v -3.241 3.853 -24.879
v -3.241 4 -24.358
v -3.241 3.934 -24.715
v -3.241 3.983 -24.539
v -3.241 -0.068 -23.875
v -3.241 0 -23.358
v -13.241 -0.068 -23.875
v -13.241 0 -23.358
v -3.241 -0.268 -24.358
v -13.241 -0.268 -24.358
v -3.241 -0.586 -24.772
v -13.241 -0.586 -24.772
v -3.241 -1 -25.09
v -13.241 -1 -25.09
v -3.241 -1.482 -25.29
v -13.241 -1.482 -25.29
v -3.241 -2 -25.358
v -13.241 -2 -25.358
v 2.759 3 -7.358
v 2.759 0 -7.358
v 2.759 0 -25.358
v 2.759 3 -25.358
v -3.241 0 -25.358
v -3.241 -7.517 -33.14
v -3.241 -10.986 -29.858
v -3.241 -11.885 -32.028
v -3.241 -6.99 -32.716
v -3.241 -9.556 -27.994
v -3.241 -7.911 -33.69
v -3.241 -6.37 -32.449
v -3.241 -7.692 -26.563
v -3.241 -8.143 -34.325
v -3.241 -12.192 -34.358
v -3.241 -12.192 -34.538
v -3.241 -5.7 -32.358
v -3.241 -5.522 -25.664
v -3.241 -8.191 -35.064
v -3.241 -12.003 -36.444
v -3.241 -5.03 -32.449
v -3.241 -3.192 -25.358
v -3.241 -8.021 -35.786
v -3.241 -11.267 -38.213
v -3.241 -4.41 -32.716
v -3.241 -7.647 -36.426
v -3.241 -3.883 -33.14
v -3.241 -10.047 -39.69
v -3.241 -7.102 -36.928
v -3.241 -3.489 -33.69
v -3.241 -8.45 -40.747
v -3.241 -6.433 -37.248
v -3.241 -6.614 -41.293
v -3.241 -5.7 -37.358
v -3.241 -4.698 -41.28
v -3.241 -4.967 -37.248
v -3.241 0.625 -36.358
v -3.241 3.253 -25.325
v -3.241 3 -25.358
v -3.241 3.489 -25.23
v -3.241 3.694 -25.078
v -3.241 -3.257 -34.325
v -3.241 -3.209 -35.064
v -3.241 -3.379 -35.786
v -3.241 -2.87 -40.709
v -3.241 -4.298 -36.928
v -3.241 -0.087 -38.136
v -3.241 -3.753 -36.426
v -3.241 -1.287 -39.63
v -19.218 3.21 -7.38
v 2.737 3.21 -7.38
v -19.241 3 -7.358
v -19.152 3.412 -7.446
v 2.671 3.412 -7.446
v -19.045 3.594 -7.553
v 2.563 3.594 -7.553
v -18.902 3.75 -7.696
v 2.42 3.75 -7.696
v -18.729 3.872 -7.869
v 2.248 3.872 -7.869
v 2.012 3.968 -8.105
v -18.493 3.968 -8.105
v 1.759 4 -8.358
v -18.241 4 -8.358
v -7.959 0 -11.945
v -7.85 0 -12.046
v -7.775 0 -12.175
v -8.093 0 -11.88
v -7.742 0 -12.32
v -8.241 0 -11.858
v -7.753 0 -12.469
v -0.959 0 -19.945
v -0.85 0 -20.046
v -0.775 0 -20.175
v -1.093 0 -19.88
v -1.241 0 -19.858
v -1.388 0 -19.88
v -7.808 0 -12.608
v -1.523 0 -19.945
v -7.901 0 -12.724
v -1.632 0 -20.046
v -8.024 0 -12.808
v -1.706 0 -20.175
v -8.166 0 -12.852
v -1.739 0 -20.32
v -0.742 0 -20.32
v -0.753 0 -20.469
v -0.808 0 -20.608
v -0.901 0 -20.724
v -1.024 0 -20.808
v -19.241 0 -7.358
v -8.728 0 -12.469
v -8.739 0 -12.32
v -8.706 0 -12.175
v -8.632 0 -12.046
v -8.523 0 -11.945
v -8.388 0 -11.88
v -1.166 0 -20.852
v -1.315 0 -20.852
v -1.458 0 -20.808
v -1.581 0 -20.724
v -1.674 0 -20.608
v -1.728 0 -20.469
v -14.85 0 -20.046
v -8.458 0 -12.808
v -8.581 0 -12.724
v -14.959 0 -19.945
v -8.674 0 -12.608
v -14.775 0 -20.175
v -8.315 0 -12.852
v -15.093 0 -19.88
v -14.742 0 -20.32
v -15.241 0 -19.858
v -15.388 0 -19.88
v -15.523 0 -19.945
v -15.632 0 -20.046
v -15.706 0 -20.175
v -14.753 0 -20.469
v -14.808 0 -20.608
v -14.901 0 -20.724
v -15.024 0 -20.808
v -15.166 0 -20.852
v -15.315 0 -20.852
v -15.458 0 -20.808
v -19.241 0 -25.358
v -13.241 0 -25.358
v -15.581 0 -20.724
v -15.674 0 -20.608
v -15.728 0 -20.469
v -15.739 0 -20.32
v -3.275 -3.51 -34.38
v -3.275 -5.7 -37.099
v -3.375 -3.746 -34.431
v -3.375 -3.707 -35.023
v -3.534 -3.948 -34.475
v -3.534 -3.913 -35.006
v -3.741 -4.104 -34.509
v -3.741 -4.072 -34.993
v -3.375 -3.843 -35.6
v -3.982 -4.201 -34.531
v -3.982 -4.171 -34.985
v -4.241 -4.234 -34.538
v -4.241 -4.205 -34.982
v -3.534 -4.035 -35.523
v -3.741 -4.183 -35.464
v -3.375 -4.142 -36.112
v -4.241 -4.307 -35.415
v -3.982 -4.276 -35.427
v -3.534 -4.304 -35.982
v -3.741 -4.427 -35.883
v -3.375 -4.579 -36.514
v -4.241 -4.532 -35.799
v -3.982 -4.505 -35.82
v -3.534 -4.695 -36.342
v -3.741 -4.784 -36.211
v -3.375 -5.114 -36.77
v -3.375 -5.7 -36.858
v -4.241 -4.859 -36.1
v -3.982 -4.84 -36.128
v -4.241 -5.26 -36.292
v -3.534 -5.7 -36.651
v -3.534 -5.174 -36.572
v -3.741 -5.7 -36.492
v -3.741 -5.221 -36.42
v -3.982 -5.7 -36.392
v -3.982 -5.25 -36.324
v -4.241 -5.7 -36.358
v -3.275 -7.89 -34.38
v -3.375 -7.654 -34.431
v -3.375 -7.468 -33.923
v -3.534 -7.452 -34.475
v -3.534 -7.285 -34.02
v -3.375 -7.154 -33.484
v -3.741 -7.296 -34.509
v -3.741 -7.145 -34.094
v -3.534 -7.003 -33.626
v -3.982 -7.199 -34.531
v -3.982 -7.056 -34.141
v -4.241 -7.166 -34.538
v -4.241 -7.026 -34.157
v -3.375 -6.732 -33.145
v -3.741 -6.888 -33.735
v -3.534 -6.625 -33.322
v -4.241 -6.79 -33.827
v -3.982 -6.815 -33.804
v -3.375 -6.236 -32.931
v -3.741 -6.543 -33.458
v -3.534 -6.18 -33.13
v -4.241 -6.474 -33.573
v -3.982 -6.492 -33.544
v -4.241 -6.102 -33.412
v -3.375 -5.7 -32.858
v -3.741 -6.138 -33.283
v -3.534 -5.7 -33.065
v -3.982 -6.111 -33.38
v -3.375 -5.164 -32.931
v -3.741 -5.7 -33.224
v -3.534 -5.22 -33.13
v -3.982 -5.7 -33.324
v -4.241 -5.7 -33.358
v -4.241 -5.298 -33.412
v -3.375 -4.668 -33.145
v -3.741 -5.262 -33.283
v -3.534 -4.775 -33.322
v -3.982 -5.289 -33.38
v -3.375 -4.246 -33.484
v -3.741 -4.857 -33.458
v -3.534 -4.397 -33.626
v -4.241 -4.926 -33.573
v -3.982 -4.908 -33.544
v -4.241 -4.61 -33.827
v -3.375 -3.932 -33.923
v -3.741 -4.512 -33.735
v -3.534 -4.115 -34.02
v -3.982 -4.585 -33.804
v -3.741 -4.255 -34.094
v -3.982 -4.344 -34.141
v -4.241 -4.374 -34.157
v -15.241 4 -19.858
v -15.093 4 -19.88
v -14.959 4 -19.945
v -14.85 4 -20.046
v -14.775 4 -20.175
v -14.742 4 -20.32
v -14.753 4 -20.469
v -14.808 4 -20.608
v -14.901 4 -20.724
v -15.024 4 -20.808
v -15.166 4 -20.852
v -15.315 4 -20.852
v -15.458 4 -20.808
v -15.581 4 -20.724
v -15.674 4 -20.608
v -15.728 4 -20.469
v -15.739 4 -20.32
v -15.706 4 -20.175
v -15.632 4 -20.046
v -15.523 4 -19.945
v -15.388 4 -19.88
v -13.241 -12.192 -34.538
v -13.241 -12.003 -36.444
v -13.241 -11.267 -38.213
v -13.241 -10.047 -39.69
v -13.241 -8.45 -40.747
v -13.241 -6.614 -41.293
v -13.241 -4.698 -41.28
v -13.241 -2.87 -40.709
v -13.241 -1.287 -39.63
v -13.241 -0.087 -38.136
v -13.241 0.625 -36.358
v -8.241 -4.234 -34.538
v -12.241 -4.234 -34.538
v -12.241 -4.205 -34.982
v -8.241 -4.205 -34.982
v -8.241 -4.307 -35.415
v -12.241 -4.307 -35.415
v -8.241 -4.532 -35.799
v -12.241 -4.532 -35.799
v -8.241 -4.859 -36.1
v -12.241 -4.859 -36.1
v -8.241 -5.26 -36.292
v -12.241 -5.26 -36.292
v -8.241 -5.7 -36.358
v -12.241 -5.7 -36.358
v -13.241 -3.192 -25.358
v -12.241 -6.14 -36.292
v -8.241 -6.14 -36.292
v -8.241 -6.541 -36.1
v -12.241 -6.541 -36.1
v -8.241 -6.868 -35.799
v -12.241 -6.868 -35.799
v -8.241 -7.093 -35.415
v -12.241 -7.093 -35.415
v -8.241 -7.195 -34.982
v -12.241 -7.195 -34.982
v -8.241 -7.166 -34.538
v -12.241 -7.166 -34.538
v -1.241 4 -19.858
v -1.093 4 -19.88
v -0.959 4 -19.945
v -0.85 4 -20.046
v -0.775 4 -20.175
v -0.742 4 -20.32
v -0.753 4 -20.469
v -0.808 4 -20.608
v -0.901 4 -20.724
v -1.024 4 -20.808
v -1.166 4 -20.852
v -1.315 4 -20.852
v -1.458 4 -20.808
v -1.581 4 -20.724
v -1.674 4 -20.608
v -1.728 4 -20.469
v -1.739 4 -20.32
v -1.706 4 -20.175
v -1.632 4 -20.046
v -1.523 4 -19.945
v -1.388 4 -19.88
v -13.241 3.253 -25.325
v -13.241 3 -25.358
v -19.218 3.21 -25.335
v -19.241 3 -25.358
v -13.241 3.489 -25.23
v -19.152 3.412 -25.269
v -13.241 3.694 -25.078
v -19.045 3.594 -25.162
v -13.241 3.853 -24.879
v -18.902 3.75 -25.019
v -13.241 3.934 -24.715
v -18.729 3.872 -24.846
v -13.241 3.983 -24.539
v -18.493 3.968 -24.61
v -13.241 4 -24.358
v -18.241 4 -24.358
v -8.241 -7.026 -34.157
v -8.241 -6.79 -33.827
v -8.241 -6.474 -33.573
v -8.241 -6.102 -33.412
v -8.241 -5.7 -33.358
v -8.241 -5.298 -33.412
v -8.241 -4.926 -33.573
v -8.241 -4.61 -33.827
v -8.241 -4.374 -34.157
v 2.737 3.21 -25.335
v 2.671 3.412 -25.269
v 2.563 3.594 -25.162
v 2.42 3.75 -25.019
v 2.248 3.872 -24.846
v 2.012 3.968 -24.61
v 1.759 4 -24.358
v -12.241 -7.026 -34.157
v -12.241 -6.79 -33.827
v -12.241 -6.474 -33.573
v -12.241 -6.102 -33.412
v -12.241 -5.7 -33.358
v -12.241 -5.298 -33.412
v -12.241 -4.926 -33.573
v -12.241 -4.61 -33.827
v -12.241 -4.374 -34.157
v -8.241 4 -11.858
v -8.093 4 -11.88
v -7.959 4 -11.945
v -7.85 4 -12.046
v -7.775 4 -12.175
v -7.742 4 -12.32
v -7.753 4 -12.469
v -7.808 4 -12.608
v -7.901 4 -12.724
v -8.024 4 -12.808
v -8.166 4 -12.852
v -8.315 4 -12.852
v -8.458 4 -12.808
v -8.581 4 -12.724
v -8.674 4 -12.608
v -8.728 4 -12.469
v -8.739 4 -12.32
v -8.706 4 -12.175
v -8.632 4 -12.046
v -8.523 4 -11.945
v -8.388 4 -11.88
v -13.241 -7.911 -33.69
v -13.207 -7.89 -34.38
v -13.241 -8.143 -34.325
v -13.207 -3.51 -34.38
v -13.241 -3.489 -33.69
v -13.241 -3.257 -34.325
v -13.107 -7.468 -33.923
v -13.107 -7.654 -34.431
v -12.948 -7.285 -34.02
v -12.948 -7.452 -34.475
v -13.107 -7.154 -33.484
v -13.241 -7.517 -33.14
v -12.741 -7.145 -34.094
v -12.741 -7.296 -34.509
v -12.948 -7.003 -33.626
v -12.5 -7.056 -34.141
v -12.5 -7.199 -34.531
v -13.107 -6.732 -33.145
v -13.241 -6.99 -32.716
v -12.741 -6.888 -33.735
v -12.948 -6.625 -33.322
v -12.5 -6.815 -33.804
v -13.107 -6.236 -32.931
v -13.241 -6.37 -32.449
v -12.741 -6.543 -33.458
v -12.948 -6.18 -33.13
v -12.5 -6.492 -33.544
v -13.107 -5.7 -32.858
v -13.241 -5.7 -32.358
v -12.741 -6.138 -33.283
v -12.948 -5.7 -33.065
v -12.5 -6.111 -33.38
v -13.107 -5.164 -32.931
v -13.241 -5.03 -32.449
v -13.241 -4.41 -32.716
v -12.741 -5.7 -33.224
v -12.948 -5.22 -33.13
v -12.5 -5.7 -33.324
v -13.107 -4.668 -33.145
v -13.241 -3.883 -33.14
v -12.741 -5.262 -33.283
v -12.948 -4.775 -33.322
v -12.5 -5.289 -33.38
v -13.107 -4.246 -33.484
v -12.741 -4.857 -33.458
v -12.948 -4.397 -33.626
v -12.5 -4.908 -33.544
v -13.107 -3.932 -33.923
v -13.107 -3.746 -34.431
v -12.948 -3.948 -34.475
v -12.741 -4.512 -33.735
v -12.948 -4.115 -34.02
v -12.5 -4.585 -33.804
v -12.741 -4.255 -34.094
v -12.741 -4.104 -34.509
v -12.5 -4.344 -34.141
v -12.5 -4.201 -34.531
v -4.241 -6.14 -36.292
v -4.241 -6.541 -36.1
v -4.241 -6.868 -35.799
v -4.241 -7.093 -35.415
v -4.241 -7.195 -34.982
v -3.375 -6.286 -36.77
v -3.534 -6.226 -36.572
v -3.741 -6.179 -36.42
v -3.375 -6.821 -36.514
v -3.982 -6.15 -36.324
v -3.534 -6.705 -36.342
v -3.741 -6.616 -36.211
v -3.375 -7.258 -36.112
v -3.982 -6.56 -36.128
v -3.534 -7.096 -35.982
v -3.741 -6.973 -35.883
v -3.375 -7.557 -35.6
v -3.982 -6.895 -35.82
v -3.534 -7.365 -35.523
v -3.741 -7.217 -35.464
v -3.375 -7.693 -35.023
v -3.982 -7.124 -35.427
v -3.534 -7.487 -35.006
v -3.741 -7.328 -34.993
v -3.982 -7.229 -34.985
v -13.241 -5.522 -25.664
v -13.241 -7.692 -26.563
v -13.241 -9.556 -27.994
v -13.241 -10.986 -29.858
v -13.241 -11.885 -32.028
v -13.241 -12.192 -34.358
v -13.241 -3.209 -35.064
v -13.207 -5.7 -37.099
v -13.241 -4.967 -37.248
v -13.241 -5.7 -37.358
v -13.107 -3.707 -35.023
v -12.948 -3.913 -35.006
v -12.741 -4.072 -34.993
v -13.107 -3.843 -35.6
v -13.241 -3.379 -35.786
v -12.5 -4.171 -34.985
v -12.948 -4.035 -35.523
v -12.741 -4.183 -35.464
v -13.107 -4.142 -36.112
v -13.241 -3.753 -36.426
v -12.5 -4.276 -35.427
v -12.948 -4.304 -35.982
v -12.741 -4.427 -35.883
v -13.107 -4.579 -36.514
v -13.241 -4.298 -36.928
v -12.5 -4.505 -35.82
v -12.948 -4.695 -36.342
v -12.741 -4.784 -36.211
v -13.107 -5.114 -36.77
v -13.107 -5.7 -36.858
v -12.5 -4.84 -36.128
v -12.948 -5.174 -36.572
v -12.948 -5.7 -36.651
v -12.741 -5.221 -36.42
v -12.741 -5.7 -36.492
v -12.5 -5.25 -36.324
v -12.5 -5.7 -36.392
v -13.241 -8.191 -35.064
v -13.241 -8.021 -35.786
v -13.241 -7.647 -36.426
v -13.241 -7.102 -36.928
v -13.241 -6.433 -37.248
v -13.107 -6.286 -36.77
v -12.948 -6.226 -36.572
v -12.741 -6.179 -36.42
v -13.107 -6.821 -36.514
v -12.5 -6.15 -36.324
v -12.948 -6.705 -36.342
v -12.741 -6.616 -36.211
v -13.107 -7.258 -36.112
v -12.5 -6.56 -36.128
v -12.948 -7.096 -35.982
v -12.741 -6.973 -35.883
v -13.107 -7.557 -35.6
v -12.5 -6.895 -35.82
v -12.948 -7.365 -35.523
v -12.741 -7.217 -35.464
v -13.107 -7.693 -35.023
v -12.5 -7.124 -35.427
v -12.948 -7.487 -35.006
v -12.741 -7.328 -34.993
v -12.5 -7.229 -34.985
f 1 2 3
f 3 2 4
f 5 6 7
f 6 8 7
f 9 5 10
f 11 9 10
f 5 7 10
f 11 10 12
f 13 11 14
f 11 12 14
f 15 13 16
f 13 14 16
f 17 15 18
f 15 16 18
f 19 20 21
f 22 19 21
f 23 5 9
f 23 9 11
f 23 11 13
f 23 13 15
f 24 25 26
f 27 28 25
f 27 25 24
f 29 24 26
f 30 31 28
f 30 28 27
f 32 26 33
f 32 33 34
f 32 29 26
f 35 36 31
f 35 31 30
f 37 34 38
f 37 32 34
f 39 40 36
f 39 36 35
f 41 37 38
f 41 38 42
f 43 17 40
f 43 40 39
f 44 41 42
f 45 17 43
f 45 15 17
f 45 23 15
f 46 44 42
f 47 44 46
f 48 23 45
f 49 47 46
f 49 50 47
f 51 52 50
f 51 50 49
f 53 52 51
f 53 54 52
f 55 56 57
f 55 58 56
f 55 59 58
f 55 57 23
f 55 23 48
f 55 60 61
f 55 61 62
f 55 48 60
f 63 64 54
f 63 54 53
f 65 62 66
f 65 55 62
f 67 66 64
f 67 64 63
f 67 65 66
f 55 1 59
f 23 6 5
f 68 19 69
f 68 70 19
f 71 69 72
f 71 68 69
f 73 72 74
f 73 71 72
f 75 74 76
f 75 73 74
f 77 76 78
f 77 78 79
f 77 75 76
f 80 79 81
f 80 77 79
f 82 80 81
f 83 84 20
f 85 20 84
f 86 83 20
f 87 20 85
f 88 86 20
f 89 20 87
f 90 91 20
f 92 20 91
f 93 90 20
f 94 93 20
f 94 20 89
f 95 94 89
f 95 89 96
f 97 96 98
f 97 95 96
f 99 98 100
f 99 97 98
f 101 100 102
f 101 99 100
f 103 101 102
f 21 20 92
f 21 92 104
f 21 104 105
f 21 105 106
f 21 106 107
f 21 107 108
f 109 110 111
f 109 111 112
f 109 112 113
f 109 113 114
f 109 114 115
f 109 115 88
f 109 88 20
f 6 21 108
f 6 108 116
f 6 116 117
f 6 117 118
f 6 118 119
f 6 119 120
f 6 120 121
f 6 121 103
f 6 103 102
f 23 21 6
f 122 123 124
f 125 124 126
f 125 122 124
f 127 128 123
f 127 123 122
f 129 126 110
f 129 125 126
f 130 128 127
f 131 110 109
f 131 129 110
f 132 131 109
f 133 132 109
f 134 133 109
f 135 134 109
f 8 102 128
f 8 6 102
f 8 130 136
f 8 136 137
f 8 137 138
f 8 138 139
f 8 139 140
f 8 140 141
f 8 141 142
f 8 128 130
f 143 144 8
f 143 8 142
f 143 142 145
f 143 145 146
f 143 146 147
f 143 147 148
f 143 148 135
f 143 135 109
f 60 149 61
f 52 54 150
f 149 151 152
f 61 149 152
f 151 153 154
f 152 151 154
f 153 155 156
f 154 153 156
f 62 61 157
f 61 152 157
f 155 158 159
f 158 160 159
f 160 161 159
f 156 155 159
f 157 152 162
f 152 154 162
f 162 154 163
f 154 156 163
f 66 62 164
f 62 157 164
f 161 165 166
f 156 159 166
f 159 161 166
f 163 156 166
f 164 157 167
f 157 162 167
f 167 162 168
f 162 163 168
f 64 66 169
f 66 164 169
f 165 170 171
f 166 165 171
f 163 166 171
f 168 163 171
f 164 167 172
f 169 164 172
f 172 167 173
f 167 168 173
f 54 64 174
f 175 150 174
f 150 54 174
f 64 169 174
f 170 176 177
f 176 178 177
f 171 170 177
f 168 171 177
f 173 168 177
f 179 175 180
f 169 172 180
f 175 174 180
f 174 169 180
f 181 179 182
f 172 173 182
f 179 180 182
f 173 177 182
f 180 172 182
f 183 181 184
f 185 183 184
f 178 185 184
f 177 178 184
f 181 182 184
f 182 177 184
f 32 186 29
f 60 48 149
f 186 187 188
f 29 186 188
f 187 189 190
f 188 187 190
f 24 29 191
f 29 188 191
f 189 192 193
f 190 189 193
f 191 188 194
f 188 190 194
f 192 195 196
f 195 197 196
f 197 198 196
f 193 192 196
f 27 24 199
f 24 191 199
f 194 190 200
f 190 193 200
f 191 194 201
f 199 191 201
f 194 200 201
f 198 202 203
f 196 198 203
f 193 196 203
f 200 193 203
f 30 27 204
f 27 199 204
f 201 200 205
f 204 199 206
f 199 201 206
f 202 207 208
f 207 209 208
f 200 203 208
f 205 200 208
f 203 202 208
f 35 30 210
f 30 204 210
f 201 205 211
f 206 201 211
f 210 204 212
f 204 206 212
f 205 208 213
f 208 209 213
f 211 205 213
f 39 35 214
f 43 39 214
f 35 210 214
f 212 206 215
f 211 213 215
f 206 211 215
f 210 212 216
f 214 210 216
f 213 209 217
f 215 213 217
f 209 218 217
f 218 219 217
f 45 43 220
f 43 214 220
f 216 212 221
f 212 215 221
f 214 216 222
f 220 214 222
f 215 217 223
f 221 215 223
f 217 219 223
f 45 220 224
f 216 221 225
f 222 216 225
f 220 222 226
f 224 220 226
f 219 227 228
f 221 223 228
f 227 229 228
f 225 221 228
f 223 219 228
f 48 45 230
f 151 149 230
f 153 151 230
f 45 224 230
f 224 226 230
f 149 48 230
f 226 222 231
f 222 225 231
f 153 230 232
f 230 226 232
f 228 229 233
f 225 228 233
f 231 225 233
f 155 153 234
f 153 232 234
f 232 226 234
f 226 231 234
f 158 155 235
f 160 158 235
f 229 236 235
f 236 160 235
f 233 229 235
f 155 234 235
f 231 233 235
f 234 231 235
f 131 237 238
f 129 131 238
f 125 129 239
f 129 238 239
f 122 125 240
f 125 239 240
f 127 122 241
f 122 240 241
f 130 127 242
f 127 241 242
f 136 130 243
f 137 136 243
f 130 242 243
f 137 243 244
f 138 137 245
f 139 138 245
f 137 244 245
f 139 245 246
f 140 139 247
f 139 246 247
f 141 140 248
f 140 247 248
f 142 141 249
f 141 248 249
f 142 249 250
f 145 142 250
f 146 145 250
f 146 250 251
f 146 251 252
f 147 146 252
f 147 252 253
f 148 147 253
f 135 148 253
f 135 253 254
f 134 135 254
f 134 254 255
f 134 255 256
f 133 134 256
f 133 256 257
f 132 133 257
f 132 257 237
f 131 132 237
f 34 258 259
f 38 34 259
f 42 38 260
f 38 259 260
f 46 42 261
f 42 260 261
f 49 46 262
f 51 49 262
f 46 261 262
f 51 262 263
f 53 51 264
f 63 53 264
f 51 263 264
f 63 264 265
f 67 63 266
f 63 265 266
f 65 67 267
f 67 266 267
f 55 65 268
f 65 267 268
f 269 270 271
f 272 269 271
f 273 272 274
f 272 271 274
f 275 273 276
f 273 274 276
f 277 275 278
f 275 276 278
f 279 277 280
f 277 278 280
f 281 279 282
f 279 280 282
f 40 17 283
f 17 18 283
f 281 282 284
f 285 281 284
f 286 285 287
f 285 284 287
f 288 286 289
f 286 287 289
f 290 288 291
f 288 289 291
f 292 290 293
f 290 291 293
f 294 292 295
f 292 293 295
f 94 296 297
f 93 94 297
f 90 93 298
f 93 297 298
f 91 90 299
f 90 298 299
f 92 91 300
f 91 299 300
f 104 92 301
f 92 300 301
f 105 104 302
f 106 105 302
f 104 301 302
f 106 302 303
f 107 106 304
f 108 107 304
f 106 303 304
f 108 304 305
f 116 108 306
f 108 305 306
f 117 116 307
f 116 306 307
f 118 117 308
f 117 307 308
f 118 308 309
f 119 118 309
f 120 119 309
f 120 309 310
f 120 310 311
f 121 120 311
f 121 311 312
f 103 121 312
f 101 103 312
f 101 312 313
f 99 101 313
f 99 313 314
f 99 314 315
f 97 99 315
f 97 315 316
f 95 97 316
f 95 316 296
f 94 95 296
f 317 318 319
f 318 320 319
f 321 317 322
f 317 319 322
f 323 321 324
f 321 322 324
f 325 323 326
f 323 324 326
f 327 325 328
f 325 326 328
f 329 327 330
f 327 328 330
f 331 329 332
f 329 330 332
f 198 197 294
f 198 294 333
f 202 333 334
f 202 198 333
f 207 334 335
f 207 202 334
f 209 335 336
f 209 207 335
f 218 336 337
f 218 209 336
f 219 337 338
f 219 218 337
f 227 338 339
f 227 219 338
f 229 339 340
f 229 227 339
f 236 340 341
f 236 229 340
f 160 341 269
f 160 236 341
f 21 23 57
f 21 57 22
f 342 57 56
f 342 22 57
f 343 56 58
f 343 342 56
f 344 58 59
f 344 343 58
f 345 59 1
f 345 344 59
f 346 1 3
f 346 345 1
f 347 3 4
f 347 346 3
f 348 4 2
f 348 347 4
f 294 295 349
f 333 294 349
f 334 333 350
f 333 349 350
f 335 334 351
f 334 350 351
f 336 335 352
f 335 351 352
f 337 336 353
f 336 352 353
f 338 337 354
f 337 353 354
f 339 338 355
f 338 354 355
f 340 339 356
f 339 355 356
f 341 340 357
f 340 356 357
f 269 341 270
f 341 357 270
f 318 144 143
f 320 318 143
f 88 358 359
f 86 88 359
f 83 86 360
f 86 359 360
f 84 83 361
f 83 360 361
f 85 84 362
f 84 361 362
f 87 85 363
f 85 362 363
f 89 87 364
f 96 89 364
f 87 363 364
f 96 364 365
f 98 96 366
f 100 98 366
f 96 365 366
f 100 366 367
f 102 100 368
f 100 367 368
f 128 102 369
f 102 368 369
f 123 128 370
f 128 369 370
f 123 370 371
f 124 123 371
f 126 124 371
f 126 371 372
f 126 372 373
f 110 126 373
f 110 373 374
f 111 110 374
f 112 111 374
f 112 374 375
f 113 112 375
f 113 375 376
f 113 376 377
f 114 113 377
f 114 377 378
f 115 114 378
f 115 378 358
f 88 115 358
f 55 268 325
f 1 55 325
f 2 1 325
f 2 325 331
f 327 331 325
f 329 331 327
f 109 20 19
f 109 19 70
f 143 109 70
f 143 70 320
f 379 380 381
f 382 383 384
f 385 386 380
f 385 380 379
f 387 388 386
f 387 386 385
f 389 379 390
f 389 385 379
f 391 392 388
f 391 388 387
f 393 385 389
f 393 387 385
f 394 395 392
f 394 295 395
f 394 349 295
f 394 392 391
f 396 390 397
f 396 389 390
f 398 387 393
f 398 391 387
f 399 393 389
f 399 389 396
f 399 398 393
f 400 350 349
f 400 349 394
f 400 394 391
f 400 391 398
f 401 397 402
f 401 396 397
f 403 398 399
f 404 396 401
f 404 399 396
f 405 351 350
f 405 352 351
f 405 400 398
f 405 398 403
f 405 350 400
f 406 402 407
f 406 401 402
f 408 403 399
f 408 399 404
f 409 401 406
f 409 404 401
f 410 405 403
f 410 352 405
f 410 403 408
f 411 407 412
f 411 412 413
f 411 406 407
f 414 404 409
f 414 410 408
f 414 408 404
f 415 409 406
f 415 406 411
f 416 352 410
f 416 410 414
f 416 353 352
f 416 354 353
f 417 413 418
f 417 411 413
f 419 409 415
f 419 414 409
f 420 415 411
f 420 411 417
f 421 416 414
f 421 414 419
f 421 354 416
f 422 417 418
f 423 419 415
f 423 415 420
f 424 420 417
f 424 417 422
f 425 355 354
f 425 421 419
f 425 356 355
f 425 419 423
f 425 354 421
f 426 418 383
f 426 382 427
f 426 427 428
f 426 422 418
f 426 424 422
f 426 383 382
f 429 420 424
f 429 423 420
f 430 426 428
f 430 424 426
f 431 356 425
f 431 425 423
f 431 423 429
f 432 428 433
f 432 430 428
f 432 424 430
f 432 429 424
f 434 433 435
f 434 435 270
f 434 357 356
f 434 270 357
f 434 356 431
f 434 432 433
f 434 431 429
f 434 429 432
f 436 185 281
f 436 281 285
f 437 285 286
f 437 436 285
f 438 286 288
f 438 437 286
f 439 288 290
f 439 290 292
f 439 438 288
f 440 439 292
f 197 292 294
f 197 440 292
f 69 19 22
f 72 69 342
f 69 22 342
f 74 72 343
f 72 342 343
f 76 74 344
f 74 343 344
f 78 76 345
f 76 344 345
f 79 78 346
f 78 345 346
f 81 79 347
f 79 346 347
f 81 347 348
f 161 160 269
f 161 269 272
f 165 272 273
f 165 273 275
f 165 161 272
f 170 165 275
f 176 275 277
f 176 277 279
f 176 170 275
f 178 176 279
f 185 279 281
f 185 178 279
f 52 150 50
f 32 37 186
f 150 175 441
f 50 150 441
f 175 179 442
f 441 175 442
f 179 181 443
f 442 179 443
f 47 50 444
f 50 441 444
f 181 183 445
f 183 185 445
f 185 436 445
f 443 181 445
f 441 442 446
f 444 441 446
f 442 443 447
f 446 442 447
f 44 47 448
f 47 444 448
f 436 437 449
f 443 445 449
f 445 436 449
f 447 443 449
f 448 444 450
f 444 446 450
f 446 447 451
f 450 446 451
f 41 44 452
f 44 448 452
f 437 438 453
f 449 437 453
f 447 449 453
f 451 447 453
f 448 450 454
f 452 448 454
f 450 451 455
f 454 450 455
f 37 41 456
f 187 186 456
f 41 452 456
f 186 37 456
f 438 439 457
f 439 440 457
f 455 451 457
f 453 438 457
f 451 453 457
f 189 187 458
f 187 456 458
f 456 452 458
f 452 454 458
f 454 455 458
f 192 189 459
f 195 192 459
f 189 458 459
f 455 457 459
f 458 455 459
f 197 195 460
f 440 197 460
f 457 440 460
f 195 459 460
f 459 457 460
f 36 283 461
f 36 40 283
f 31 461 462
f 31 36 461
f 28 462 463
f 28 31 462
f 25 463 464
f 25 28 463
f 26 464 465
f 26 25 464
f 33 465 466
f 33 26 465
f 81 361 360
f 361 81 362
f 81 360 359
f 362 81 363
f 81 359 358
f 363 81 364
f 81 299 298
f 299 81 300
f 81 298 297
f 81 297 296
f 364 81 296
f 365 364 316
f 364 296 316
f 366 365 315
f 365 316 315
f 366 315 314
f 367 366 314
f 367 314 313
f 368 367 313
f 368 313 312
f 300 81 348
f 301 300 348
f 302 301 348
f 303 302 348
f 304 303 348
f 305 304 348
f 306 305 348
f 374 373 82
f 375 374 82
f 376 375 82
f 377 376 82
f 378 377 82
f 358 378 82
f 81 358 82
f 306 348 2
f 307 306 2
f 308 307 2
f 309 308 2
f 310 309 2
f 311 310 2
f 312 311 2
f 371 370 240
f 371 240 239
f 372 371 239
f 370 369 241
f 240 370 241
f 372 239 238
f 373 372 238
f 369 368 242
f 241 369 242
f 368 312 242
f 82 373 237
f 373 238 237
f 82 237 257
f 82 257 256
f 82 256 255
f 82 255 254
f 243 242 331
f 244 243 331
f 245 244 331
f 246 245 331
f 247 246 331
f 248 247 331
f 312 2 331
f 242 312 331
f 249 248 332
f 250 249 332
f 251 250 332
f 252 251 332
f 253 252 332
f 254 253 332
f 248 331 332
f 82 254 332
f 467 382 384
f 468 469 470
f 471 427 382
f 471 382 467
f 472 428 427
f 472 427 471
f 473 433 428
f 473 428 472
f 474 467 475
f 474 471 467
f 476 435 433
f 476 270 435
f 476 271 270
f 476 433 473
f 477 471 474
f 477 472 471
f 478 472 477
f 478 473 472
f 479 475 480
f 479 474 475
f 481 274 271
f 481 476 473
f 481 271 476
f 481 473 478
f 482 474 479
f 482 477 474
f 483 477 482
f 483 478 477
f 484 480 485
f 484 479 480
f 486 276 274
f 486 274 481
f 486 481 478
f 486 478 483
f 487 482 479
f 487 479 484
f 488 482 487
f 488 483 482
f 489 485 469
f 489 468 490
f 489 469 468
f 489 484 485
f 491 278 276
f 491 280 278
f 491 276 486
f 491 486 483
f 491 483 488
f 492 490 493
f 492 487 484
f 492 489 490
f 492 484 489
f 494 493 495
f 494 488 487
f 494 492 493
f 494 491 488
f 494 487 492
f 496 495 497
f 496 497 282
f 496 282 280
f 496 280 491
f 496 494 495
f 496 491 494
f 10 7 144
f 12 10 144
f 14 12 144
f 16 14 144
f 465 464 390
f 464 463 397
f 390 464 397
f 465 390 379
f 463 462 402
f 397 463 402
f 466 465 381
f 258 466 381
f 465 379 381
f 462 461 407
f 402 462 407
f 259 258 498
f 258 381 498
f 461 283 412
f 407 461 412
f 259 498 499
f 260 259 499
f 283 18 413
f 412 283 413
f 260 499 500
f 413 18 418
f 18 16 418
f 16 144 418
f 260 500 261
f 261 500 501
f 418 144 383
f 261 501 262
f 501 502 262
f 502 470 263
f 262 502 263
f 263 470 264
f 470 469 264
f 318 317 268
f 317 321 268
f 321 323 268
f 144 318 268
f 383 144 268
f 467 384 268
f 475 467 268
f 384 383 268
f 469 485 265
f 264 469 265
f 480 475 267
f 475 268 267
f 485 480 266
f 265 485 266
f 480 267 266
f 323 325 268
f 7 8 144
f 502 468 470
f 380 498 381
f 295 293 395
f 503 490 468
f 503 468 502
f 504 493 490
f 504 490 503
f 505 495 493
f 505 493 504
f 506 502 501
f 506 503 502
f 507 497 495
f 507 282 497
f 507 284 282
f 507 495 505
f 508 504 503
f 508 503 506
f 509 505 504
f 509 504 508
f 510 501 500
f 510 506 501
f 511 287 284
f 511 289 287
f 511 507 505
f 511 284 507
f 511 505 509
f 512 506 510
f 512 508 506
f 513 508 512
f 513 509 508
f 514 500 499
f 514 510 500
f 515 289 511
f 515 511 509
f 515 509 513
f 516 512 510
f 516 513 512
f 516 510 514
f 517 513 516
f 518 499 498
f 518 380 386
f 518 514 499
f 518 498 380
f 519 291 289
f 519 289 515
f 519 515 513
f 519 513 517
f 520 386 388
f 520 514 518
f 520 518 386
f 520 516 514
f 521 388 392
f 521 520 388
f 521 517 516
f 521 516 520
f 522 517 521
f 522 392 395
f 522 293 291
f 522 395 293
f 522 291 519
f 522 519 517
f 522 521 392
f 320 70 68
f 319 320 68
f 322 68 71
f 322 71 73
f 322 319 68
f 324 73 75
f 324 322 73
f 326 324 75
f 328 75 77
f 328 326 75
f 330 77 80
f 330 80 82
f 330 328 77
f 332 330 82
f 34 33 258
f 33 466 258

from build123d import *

# Parameters (mm, degrees)
SKETCH1_W           = 11
SKETCH1_H           = 18
SKETCH1_W_2         = 5
SKETCH1_H_2         = 11
BOSS_EXTRUDE1_DEPTH = 4
BOSS_EXTRUDE2_DEPTH = 5
SKETCH3_R           = 0.5
CUT_EXTRUDE1_DEPTH  = 5
FILLET1_R           = 1
FILLET3_R           = 2
FILLET4_R           = 9
CUT_EXTRUDE2_DEPTH  = 10


with BuildPart() as part:
    # Sketch1 → Boss-Extrude1 (new body)
    with BuildSketch(Plane(origin=(0, 0, 0), x_dir=(1, 0, 0), z_dir=(0, 1, 0))):
        with Locations((-2.740875912, 16.357664234)):
            Rectangle(SKETCH1_W, SKETCH1_H)
        with Locations((-5.740875912, 30.857664234)):
            Rectangle(SKETCH1_W_2, SKETCH1_H_2)
    boss_extrude1 = extrude(amount=BOSS_EXTRUDE1_DEPTH)

    # Sketch2 → Boss-Extrude2 (add)
    with BuildSketch(Plane(origin=(-3.240875912, 0, 0), x_dir=(0, 0, -1), z_dir=(1, 0, 0))):
        with BuildLine():
            Line((34.537911903, 0), (25.357664234, 0))
            Line((25.357664234, 0), (25.357664234, -12.192130501))
            Line((25.357664234, -12.192130501), (34.537911903, -12.192130501))
            Line((34.537911903, -12.192130501), (34.537911903, -7.165523267))
            ThreePointArc((34.537911903, -7.165523267), (33.357664234, -5.7), (34.537911903, -4.234476733))
            Line((34.537911903, -4.234476733), (34.537911903, 0))
        make_face()
        with BuildLine():
            Line((36.357664234, 0), (34.537911903, 0))
            Line((34.537911903, 0), (34.537911903, -4.234476733))
            ThreePointArc((34.537911903, -4.234476733), (35.798507341, -4.531747353), (36.357664234, -5.7))
            ThreePointArc((36.357664234, -5.7), (35.798507341, -6.868252647), (34.537911903, -7.165523267))
            Line((34.537911903, -7.165523267), (34.537911903, -12.192130501))
            ThreePointArc((34.537911903, -12.192130501), (41.293121094, -6.613725887), (36.357664234, 0.62455532))
            Line((36.357664234, 0.62455532), (36.357664234, 0))
        make_face()
    boss_extrude2 = extrude(amount=-BOSS_EXTRUDE2_DEPTH)

    # Mirror1: Boss-Extrude1, Boss-Extrude2 across plane
    add(boss_extrude1.mirror(Plane(origin=(-8.240875912, 4, 0), x_dir=(0, 0, 1), z_dir=(1, 0, 0))))
    add(boss_extrude2.mirror(Plane(origin=(-8.240875912, 4, 0), x_dir=(0, 0, 1), z_dir=(1, 0, 0))))

    # Sketch3 → Cut-Extrude1 (cut)
    with BuildSketch(Plane(origin=(0, 4, 0), x_dir=(1, 0, 0), z_dir=(0, 1, 0))):
        with Locations(Location((-1.240875912, 20.357664234, 0), (0, 0, 270))):
            Circle(SKETCH3_R)
        with Locations(Location((-8.240875912, 12.357664234, 0), (0, 0, 270))):
            Circle(SKETCH3_R)
        with Locations(Location((-15.240875912, 20.357664234, 0), (0, 0, 270))):
            Circle(SKETCH3_R)
    extrude(amount=-CUT_EXTRUDE1_DEPTH, mode=Mode.SUBTRACT)

    # Fillet1
    fillet1_edges = [part.edges().sort_by_distance(p)[0] for p in [
        (-0.240875912, 4, -25.357664234),
        (-3.240875912, -4.234476733, -35.177416564),
        (-8.240875912, 4, -7.357664234),
        (-19.240875912, 4, -16.357664234),
        (-16.240875912, 4, -25.357664234),
        (2.759124088, 4, -16.357664234),
        (-13.240875912, -4.234476733, -35.177416564),
    ]]
    fillet(fillet1_edges, radius=FILLET1_R)

    # Fillet3
    fillet3_edges = [part.edges().sort_by_distance(p)[0] for p in [
        (-8.240875912, 0, -25.357664234),
    ]]
    fillet(fillet3_edges, radius=FILLET3_R)

    # Fillet4
    fillet4_edges = [part.edges().sort_by_distance(p)[0] for p in [
        (-8.240875912, -12.192130501, -25.357664234),
    ]]
    fillet(fillet4_edges, radius=FILLET4_R)

    # Sketch4 → Cut-Extrude2 (cut)
    with BuildSketch(Plane.ZY.offset(13.240875912)):
        Polygon((-36.357664234, 0.62455532), (-24.357664234, 4), (-36.357664234, 4), align=None)
    extrude(amount=-CUT_EXTRUDE2_DEPTH, mode=Mode.SUBTRACT)


solid = part.part
